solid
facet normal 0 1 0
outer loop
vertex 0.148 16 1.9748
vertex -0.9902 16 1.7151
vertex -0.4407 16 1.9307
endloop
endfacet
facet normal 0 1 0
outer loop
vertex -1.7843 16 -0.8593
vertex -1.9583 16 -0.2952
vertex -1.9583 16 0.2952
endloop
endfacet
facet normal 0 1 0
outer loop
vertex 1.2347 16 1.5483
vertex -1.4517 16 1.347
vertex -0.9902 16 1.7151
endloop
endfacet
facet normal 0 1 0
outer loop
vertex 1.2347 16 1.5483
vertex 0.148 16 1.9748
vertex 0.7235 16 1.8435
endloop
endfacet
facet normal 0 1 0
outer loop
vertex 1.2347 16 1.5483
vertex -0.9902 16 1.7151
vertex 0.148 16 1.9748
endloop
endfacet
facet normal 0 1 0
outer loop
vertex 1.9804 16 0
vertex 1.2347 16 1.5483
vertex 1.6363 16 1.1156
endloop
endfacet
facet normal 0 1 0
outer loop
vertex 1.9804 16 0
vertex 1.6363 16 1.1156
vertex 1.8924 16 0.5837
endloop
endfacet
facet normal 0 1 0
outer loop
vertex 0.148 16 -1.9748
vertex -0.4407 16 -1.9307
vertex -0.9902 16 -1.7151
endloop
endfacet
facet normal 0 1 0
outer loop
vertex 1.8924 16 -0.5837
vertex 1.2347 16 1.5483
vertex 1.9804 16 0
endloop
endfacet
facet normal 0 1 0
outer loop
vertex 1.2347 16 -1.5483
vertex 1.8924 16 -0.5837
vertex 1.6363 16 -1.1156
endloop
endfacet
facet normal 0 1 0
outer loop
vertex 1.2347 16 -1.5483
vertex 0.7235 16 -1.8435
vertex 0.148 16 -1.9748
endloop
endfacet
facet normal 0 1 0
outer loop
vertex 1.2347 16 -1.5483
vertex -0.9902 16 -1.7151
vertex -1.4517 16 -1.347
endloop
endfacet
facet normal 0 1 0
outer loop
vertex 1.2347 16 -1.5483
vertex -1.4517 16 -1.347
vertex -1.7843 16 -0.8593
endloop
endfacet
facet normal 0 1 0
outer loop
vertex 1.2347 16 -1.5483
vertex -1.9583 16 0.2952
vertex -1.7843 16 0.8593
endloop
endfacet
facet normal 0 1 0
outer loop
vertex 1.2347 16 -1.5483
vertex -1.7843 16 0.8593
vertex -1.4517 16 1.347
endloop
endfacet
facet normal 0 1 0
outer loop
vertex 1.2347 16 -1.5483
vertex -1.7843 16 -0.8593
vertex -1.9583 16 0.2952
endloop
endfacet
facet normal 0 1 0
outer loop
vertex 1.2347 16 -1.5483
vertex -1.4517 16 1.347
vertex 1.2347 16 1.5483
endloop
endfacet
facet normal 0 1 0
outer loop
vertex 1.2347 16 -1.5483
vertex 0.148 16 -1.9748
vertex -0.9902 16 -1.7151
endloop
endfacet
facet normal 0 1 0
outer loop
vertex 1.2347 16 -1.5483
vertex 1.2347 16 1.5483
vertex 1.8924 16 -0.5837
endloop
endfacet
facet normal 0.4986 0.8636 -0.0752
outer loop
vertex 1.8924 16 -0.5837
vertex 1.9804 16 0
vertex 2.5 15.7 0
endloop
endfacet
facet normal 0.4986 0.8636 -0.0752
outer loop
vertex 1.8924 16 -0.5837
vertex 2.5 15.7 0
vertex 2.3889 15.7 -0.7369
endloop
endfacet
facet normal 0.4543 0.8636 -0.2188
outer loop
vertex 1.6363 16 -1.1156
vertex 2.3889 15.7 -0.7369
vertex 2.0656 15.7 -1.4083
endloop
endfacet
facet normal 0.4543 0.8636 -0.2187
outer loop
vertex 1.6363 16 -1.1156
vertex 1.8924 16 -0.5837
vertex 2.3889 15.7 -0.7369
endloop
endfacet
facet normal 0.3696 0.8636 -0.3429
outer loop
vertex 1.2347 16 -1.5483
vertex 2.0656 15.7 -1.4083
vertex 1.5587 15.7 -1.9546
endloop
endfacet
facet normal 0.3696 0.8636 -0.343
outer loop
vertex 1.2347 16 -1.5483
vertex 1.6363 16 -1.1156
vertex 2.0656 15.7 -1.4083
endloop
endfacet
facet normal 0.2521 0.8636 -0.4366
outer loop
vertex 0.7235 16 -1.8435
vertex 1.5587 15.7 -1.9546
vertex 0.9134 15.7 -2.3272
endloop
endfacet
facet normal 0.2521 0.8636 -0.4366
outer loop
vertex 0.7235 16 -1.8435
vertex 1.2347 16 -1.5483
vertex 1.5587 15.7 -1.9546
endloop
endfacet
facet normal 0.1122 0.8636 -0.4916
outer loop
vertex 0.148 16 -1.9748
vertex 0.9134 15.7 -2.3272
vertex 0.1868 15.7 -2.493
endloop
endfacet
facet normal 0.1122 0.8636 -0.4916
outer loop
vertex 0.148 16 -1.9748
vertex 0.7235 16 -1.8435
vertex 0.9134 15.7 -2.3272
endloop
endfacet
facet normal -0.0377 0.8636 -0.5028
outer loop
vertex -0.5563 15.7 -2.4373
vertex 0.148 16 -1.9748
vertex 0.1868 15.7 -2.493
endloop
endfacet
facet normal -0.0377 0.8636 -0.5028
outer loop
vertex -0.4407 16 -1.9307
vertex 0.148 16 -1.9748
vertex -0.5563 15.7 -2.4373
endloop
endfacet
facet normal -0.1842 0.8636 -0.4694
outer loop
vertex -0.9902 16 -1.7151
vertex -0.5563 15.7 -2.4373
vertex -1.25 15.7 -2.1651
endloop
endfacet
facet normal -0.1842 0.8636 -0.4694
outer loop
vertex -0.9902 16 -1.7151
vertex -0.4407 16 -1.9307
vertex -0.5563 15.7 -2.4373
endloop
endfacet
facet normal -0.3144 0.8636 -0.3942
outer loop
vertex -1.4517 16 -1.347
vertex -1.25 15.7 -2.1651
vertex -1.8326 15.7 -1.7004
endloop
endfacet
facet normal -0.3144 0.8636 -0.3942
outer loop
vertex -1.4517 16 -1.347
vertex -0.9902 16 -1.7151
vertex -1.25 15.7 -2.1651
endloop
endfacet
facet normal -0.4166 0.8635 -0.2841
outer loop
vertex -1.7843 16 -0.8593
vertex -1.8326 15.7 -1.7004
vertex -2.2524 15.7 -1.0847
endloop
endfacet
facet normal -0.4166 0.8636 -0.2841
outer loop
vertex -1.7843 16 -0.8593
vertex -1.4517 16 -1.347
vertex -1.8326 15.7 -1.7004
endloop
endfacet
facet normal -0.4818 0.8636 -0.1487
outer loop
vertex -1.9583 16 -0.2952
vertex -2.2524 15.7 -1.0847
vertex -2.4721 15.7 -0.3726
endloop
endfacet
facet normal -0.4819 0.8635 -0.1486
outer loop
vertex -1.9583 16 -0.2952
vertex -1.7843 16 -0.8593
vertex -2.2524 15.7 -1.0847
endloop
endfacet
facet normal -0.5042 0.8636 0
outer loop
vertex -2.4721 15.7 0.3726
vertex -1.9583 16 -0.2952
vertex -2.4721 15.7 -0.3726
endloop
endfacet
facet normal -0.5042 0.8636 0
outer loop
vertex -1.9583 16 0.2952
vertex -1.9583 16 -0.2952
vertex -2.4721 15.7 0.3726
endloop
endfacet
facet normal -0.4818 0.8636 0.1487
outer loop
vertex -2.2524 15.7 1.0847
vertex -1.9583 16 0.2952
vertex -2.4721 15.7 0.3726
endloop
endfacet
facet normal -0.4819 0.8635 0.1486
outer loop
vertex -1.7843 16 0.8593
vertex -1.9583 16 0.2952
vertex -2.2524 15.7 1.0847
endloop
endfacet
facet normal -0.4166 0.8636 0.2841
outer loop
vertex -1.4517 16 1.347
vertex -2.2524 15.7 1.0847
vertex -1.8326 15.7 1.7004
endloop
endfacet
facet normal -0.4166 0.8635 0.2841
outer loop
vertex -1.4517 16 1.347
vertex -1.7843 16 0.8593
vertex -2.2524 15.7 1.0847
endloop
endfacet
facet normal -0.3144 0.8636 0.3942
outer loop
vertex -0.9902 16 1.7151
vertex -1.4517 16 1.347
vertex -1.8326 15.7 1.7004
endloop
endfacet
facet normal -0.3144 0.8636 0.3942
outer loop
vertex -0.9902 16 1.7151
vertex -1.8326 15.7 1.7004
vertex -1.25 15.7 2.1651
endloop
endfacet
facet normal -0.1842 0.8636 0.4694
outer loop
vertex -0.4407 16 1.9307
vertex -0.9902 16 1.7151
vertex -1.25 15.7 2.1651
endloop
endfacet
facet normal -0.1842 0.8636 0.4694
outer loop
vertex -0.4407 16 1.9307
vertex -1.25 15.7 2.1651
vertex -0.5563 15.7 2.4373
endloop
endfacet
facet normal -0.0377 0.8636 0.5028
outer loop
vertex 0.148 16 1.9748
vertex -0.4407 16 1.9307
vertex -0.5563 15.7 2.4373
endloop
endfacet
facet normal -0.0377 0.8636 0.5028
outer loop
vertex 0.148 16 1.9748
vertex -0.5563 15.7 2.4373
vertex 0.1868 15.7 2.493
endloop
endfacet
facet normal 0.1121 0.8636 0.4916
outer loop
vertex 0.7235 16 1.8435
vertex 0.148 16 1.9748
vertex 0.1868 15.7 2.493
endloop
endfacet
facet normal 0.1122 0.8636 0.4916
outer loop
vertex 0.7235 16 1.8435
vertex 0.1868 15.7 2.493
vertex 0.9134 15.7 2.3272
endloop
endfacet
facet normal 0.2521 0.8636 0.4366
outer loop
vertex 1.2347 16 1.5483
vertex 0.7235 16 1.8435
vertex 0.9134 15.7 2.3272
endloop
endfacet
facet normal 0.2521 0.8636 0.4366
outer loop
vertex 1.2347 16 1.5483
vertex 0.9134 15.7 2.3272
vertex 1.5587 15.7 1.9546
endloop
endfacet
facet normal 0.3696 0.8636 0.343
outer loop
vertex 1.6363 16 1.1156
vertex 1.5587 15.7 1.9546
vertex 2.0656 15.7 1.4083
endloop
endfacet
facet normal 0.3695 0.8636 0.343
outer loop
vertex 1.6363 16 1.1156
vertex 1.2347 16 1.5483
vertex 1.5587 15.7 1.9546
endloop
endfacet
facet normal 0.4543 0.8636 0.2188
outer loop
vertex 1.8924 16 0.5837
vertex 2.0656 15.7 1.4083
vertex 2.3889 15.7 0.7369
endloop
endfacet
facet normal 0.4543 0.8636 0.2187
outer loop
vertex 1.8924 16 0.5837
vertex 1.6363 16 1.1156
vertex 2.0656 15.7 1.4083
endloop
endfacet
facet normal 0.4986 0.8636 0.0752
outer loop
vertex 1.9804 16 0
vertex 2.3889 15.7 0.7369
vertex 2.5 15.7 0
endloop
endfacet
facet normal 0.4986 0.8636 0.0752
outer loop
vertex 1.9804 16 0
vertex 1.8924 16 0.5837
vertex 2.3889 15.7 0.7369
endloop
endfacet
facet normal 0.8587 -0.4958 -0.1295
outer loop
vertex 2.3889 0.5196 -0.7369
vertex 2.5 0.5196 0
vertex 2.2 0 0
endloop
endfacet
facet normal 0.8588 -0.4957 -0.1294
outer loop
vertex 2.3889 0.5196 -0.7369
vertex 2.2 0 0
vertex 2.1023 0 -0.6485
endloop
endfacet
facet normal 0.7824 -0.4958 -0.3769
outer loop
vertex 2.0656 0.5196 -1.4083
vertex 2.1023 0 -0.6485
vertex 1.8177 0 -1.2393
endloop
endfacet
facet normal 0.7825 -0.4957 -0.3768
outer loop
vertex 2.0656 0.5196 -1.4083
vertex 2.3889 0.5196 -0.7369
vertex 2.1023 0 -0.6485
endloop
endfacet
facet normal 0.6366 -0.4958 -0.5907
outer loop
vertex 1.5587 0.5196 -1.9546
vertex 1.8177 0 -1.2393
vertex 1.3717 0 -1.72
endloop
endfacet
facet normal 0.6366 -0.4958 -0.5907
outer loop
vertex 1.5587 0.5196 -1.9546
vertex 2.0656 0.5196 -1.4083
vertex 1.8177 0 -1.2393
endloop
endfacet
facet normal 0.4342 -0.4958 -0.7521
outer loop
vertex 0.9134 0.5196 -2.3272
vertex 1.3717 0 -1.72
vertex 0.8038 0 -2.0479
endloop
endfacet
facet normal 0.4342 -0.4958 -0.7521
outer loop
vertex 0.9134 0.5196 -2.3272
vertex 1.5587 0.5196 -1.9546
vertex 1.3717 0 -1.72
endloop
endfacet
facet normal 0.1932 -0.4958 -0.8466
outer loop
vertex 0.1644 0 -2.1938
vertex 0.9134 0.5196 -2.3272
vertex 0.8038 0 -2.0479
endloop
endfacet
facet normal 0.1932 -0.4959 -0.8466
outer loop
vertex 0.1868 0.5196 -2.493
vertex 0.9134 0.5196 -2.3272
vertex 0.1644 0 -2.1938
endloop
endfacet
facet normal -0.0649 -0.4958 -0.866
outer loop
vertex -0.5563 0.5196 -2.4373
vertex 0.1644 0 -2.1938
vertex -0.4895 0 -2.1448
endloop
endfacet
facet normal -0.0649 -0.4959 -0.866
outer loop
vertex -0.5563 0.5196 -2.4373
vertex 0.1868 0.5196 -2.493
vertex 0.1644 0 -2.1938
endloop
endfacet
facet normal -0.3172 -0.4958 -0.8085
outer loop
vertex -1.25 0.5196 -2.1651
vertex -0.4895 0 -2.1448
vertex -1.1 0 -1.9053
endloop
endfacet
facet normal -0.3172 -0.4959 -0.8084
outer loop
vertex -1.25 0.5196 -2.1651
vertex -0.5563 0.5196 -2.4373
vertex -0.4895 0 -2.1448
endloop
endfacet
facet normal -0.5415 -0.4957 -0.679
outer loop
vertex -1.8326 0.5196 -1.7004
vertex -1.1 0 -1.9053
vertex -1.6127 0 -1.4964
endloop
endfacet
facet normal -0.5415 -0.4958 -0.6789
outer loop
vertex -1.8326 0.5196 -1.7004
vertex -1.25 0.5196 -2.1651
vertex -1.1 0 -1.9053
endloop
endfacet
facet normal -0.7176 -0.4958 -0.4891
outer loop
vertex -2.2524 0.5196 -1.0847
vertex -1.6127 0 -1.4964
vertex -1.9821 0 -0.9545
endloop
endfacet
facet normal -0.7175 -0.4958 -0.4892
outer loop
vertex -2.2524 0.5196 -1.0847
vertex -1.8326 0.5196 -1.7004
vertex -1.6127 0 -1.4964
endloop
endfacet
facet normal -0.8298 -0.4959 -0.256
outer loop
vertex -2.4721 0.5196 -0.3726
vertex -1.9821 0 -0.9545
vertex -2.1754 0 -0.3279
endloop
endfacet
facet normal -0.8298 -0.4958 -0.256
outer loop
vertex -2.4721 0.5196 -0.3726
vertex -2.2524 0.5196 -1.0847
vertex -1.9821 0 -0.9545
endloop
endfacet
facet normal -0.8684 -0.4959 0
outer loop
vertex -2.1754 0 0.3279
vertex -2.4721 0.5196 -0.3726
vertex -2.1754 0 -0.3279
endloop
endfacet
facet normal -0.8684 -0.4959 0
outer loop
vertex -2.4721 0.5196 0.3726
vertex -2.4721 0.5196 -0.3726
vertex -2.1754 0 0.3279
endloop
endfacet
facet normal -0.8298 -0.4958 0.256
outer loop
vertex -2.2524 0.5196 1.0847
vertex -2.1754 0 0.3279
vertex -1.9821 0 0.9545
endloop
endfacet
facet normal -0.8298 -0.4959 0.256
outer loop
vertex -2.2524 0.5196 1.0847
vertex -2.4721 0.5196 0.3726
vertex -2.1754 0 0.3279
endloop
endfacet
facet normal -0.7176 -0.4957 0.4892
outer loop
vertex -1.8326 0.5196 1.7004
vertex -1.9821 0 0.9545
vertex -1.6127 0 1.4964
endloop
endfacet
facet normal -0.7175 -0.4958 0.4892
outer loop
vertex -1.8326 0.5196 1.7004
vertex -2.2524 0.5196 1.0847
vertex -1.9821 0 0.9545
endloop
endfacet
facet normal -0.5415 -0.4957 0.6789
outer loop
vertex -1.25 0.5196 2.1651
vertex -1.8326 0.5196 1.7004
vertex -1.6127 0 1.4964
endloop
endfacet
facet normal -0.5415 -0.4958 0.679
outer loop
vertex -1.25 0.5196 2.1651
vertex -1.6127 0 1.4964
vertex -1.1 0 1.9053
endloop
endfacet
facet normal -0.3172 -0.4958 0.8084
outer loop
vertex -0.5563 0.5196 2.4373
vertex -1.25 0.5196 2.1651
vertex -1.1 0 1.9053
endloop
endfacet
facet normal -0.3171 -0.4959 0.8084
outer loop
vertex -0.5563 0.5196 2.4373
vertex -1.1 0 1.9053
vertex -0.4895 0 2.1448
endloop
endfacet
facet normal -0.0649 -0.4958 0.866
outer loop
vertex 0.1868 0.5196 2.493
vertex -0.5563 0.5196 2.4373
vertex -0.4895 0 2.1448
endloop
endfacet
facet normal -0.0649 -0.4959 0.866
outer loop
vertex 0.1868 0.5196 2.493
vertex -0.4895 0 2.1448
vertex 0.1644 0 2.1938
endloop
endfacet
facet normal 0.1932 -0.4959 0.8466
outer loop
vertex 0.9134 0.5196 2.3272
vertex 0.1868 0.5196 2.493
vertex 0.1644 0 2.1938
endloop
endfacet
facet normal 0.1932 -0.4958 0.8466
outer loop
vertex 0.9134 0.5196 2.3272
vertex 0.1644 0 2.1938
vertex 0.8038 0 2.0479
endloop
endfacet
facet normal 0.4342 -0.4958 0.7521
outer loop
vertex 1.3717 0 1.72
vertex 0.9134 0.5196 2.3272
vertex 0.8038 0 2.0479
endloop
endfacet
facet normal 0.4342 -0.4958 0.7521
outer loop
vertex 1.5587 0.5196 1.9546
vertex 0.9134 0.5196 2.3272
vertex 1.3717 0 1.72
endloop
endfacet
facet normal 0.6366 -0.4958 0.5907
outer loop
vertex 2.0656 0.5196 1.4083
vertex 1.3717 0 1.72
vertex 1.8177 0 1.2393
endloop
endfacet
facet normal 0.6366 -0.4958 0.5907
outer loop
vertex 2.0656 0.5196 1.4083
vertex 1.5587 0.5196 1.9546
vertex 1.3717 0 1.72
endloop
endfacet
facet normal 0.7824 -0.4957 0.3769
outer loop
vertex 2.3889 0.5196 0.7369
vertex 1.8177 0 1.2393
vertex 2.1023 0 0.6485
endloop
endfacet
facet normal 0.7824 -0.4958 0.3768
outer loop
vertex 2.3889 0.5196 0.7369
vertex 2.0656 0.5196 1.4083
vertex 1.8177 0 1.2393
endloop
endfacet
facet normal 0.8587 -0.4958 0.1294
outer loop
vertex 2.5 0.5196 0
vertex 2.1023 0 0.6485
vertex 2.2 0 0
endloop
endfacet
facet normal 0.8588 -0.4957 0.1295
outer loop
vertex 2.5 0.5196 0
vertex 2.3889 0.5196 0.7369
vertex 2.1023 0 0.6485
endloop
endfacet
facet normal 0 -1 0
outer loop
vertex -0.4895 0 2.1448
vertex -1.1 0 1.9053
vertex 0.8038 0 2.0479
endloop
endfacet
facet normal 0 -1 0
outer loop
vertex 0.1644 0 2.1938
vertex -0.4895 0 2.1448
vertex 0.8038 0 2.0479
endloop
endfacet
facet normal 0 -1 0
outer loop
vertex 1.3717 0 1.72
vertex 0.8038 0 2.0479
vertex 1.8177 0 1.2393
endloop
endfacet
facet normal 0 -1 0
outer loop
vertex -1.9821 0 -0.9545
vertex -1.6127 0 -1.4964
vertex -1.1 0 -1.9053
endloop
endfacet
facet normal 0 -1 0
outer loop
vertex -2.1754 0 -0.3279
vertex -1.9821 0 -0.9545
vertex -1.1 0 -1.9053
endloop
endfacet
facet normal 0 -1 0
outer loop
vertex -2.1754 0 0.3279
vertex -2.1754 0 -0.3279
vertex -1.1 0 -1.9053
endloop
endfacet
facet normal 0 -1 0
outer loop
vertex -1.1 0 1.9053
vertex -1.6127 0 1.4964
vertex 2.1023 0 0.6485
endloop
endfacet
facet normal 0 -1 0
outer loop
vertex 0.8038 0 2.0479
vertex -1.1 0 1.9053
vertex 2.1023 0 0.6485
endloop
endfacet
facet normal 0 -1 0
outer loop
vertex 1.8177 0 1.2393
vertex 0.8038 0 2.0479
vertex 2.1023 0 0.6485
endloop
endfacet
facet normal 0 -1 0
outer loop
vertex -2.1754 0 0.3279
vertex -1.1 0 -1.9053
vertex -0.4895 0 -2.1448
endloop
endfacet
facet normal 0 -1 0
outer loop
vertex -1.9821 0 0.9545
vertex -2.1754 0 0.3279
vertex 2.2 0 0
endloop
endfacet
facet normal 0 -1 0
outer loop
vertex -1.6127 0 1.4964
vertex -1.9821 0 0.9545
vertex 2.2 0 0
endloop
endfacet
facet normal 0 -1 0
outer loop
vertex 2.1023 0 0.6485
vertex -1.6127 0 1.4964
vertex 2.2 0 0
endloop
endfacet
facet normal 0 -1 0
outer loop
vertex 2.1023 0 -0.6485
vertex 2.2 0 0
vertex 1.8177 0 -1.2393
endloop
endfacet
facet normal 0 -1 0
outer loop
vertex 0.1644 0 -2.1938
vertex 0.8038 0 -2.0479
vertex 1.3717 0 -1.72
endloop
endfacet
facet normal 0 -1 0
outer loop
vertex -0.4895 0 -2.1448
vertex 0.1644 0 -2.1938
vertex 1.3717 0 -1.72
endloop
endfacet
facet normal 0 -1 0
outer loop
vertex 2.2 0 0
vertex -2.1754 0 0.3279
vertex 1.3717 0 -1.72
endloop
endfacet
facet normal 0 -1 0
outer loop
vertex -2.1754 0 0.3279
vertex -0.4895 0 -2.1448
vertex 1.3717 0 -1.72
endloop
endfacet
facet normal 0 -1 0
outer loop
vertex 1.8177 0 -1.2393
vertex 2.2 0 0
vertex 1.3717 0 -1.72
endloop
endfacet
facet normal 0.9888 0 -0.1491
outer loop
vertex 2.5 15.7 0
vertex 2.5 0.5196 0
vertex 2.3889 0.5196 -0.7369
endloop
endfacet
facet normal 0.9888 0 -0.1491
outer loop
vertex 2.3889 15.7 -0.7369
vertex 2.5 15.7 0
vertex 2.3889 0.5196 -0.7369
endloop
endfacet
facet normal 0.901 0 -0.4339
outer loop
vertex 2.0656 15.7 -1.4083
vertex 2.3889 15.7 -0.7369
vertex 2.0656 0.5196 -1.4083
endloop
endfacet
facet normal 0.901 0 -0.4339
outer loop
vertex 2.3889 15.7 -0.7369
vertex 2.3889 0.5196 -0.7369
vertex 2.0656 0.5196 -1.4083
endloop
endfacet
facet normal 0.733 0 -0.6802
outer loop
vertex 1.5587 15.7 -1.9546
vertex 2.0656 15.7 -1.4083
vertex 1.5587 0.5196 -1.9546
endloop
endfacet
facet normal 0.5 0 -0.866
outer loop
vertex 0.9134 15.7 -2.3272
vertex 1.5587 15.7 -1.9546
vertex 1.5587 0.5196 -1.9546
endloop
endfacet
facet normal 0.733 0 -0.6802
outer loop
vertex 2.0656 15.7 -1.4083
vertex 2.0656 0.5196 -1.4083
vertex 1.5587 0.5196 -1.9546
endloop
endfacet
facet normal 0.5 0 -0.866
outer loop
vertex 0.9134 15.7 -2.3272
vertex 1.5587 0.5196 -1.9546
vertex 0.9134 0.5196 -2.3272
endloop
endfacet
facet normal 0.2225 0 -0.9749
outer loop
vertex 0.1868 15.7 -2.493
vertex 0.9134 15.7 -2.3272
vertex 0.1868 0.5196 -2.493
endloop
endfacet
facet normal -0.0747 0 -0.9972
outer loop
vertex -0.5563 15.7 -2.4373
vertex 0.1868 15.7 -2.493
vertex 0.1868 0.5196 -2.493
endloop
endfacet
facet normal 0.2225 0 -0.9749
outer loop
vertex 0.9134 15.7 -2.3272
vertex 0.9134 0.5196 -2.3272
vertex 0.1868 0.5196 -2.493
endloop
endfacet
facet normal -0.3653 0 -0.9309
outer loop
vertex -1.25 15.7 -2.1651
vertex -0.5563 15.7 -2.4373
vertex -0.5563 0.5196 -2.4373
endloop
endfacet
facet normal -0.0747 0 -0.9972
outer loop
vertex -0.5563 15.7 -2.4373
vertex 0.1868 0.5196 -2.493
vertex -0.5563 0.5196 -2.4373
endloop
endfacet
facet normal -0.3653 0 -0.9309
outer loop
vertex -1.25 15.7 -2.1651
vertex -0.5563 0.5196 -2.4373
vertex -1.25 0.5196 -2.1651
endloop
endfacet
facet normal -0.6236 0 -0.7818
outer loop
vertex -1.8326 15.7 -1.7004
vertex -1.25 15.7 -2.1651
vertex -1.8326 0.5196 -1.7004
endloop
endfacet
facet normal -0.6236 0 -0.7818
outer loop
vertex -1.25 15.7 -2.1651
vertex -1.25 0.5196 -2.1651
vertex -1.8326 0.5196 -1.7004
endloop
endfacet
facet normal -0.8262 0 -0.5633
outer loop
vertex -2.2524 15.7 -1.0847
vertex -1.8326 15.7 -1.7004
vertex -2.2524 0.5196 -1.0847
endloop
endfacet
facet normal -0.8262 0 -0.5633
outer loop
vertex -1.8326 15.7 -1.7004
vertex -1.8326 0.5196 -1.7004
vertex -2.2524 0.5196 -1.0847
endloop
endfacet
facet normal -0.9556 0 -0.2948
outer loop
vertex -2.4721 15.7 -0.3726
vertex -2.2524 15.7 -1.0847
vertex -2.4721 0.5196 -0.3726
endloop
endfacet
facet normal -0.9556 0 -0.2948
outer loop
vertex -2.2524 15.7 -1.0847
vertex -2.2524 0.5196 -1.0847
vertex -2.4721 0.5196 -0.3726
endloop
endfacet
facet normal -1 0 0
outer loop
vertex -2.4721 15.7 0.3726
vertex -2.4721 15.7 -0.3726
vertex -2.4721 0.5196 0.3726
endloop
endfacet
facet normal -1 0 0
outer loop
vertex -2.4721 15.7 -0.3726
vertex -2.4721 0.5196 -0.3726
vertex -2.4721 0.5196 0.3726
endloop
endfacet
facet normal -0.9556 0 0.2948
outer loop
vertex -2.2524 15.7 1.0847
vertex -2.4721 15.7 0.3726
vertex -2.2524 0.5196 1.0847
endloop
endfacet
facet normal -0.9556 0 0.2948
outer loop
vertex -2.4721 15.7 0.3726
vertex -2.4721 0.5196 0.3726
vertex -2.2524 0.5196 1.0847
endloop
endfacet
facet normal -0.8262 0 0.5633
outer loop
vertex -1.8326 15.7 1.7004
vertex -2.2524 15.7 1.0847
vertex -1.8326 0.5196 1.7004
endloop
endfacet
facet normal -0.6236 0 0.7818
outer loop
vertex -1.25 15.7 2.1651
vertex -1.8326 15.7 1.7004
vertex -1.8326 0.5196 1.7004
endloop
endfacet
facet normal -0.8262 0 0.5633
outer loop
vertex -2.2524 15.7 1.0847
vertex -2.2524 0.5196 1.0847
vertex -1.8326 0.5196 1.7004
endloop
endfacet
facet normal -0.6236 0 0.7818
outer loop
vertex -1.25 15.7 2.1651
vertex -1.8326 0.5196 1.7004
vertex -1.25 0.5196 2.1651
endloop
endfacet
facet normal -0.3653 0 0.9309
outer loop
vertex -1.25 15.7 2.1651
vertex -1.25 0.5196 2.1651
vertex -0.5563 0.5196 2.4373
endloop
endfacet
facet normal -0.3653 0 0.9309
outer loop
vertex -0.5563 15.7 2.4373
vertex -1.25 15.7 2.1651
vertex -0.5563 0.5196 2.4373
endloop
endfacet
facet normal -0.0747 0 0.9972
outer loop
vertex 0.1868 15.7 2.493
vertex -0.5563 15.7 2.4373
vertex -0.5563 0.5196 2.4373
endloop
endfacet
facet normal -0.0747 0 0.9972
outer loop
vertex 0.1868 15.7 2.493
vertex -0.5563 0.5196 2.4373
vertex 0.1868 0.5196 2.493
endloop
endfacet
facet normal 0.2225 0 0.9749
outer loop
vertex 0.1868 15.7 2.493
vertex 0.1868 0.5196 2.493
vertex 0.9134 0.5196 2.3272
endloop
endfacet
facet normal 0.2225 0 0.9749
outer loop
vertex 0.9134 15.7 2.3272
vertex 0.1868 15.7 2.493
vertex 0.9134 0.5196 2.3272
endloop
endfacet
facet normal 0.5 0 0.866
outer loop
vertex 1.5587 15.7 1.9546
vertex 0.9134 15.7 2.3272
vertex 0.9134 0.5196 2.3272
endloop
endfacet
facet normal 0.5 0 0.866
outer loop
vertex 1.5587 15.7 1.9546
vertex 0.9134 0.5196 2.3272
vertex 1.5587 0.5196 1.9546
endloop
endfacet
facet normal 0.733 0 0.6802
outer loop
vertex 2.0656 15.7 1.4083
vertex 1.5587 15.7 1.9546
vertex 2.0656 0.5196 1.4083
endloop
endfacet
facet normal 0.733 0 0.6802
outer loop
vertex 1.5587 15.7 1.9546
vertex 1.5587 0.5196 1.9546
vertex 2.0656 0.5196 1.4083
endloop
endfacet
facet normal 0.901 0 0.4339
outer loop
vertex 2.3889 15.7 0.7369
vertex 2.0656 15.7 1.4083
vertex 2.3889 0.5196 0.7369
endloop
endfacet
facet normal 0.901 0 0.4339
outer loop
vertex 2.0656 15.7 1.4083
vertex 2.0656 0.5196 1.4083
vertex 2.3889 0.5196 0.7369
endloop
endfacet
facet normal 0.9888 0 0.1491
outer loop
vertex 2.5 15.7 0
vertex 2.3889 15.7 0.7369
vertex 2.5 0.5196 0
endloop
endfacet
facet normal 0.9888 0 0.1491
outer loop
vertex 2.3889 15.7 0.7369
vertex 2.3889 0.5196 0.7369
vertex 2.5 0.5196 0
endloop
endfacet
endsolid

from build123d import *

# Parameters (mm, degrees)
SKETCH1_R             = 2.5
BOSS_EXTRUDE1_DEPTH   = 16
CHAMFER1_SIZE         = 0.3
CHAMFER1_SIZE2        = 0.519615242
CHAMFER1_PART_2_SIZE  = 0.3
CHAMFER1_PART_2_SIZE2 = 0.519615242


with BuildPart() as part:
    # Sketch1 → Boss-Extrude1 (new body)
    with BuildSketch(Plane(origin=(0, 0, 0), x_dir=(1, 0, 0), z_dir=(0, 1, 0))):
        Circle(SKETCH1_R)
    extrude(amount=BOSS_EXTRUDE1_DEPTH)

    # Chamfer1
    chamfer1_edges = [part.edges().sort_by_distance(p)[0] for p in [
        (-2.5, 0, 0),
    ]]
    chamfer1_side = [part.faces().sort_by_distance(p)[0] for p in [
        (0, 0, 0),
    ]]
    chamfer(chamfer1_edges, length=CHAMFER1_SIZE, length2=CHAMFER1_SIZE2, reference=chamfer1_side[0])

    # Chamfer1 part 2
    chamfer1_part_2_edges = [part.edges().sort_by_distance(p)[0] for p in [
        (-2.5, 16, 0),
    ]]
    chamfer1_part_2_side = [part.faces().sort_by_distance(p)[0] for p in [
        (-2.5, 8, 0),
    ]]
    chamfer(chamfer1_part_2_edges, length=CHAMFER1_PART_2_SIZE, length2=CHAMFER1_PART_2_SIZE2, reference=chamfer1_part_2_side[0])


solid = part.part
